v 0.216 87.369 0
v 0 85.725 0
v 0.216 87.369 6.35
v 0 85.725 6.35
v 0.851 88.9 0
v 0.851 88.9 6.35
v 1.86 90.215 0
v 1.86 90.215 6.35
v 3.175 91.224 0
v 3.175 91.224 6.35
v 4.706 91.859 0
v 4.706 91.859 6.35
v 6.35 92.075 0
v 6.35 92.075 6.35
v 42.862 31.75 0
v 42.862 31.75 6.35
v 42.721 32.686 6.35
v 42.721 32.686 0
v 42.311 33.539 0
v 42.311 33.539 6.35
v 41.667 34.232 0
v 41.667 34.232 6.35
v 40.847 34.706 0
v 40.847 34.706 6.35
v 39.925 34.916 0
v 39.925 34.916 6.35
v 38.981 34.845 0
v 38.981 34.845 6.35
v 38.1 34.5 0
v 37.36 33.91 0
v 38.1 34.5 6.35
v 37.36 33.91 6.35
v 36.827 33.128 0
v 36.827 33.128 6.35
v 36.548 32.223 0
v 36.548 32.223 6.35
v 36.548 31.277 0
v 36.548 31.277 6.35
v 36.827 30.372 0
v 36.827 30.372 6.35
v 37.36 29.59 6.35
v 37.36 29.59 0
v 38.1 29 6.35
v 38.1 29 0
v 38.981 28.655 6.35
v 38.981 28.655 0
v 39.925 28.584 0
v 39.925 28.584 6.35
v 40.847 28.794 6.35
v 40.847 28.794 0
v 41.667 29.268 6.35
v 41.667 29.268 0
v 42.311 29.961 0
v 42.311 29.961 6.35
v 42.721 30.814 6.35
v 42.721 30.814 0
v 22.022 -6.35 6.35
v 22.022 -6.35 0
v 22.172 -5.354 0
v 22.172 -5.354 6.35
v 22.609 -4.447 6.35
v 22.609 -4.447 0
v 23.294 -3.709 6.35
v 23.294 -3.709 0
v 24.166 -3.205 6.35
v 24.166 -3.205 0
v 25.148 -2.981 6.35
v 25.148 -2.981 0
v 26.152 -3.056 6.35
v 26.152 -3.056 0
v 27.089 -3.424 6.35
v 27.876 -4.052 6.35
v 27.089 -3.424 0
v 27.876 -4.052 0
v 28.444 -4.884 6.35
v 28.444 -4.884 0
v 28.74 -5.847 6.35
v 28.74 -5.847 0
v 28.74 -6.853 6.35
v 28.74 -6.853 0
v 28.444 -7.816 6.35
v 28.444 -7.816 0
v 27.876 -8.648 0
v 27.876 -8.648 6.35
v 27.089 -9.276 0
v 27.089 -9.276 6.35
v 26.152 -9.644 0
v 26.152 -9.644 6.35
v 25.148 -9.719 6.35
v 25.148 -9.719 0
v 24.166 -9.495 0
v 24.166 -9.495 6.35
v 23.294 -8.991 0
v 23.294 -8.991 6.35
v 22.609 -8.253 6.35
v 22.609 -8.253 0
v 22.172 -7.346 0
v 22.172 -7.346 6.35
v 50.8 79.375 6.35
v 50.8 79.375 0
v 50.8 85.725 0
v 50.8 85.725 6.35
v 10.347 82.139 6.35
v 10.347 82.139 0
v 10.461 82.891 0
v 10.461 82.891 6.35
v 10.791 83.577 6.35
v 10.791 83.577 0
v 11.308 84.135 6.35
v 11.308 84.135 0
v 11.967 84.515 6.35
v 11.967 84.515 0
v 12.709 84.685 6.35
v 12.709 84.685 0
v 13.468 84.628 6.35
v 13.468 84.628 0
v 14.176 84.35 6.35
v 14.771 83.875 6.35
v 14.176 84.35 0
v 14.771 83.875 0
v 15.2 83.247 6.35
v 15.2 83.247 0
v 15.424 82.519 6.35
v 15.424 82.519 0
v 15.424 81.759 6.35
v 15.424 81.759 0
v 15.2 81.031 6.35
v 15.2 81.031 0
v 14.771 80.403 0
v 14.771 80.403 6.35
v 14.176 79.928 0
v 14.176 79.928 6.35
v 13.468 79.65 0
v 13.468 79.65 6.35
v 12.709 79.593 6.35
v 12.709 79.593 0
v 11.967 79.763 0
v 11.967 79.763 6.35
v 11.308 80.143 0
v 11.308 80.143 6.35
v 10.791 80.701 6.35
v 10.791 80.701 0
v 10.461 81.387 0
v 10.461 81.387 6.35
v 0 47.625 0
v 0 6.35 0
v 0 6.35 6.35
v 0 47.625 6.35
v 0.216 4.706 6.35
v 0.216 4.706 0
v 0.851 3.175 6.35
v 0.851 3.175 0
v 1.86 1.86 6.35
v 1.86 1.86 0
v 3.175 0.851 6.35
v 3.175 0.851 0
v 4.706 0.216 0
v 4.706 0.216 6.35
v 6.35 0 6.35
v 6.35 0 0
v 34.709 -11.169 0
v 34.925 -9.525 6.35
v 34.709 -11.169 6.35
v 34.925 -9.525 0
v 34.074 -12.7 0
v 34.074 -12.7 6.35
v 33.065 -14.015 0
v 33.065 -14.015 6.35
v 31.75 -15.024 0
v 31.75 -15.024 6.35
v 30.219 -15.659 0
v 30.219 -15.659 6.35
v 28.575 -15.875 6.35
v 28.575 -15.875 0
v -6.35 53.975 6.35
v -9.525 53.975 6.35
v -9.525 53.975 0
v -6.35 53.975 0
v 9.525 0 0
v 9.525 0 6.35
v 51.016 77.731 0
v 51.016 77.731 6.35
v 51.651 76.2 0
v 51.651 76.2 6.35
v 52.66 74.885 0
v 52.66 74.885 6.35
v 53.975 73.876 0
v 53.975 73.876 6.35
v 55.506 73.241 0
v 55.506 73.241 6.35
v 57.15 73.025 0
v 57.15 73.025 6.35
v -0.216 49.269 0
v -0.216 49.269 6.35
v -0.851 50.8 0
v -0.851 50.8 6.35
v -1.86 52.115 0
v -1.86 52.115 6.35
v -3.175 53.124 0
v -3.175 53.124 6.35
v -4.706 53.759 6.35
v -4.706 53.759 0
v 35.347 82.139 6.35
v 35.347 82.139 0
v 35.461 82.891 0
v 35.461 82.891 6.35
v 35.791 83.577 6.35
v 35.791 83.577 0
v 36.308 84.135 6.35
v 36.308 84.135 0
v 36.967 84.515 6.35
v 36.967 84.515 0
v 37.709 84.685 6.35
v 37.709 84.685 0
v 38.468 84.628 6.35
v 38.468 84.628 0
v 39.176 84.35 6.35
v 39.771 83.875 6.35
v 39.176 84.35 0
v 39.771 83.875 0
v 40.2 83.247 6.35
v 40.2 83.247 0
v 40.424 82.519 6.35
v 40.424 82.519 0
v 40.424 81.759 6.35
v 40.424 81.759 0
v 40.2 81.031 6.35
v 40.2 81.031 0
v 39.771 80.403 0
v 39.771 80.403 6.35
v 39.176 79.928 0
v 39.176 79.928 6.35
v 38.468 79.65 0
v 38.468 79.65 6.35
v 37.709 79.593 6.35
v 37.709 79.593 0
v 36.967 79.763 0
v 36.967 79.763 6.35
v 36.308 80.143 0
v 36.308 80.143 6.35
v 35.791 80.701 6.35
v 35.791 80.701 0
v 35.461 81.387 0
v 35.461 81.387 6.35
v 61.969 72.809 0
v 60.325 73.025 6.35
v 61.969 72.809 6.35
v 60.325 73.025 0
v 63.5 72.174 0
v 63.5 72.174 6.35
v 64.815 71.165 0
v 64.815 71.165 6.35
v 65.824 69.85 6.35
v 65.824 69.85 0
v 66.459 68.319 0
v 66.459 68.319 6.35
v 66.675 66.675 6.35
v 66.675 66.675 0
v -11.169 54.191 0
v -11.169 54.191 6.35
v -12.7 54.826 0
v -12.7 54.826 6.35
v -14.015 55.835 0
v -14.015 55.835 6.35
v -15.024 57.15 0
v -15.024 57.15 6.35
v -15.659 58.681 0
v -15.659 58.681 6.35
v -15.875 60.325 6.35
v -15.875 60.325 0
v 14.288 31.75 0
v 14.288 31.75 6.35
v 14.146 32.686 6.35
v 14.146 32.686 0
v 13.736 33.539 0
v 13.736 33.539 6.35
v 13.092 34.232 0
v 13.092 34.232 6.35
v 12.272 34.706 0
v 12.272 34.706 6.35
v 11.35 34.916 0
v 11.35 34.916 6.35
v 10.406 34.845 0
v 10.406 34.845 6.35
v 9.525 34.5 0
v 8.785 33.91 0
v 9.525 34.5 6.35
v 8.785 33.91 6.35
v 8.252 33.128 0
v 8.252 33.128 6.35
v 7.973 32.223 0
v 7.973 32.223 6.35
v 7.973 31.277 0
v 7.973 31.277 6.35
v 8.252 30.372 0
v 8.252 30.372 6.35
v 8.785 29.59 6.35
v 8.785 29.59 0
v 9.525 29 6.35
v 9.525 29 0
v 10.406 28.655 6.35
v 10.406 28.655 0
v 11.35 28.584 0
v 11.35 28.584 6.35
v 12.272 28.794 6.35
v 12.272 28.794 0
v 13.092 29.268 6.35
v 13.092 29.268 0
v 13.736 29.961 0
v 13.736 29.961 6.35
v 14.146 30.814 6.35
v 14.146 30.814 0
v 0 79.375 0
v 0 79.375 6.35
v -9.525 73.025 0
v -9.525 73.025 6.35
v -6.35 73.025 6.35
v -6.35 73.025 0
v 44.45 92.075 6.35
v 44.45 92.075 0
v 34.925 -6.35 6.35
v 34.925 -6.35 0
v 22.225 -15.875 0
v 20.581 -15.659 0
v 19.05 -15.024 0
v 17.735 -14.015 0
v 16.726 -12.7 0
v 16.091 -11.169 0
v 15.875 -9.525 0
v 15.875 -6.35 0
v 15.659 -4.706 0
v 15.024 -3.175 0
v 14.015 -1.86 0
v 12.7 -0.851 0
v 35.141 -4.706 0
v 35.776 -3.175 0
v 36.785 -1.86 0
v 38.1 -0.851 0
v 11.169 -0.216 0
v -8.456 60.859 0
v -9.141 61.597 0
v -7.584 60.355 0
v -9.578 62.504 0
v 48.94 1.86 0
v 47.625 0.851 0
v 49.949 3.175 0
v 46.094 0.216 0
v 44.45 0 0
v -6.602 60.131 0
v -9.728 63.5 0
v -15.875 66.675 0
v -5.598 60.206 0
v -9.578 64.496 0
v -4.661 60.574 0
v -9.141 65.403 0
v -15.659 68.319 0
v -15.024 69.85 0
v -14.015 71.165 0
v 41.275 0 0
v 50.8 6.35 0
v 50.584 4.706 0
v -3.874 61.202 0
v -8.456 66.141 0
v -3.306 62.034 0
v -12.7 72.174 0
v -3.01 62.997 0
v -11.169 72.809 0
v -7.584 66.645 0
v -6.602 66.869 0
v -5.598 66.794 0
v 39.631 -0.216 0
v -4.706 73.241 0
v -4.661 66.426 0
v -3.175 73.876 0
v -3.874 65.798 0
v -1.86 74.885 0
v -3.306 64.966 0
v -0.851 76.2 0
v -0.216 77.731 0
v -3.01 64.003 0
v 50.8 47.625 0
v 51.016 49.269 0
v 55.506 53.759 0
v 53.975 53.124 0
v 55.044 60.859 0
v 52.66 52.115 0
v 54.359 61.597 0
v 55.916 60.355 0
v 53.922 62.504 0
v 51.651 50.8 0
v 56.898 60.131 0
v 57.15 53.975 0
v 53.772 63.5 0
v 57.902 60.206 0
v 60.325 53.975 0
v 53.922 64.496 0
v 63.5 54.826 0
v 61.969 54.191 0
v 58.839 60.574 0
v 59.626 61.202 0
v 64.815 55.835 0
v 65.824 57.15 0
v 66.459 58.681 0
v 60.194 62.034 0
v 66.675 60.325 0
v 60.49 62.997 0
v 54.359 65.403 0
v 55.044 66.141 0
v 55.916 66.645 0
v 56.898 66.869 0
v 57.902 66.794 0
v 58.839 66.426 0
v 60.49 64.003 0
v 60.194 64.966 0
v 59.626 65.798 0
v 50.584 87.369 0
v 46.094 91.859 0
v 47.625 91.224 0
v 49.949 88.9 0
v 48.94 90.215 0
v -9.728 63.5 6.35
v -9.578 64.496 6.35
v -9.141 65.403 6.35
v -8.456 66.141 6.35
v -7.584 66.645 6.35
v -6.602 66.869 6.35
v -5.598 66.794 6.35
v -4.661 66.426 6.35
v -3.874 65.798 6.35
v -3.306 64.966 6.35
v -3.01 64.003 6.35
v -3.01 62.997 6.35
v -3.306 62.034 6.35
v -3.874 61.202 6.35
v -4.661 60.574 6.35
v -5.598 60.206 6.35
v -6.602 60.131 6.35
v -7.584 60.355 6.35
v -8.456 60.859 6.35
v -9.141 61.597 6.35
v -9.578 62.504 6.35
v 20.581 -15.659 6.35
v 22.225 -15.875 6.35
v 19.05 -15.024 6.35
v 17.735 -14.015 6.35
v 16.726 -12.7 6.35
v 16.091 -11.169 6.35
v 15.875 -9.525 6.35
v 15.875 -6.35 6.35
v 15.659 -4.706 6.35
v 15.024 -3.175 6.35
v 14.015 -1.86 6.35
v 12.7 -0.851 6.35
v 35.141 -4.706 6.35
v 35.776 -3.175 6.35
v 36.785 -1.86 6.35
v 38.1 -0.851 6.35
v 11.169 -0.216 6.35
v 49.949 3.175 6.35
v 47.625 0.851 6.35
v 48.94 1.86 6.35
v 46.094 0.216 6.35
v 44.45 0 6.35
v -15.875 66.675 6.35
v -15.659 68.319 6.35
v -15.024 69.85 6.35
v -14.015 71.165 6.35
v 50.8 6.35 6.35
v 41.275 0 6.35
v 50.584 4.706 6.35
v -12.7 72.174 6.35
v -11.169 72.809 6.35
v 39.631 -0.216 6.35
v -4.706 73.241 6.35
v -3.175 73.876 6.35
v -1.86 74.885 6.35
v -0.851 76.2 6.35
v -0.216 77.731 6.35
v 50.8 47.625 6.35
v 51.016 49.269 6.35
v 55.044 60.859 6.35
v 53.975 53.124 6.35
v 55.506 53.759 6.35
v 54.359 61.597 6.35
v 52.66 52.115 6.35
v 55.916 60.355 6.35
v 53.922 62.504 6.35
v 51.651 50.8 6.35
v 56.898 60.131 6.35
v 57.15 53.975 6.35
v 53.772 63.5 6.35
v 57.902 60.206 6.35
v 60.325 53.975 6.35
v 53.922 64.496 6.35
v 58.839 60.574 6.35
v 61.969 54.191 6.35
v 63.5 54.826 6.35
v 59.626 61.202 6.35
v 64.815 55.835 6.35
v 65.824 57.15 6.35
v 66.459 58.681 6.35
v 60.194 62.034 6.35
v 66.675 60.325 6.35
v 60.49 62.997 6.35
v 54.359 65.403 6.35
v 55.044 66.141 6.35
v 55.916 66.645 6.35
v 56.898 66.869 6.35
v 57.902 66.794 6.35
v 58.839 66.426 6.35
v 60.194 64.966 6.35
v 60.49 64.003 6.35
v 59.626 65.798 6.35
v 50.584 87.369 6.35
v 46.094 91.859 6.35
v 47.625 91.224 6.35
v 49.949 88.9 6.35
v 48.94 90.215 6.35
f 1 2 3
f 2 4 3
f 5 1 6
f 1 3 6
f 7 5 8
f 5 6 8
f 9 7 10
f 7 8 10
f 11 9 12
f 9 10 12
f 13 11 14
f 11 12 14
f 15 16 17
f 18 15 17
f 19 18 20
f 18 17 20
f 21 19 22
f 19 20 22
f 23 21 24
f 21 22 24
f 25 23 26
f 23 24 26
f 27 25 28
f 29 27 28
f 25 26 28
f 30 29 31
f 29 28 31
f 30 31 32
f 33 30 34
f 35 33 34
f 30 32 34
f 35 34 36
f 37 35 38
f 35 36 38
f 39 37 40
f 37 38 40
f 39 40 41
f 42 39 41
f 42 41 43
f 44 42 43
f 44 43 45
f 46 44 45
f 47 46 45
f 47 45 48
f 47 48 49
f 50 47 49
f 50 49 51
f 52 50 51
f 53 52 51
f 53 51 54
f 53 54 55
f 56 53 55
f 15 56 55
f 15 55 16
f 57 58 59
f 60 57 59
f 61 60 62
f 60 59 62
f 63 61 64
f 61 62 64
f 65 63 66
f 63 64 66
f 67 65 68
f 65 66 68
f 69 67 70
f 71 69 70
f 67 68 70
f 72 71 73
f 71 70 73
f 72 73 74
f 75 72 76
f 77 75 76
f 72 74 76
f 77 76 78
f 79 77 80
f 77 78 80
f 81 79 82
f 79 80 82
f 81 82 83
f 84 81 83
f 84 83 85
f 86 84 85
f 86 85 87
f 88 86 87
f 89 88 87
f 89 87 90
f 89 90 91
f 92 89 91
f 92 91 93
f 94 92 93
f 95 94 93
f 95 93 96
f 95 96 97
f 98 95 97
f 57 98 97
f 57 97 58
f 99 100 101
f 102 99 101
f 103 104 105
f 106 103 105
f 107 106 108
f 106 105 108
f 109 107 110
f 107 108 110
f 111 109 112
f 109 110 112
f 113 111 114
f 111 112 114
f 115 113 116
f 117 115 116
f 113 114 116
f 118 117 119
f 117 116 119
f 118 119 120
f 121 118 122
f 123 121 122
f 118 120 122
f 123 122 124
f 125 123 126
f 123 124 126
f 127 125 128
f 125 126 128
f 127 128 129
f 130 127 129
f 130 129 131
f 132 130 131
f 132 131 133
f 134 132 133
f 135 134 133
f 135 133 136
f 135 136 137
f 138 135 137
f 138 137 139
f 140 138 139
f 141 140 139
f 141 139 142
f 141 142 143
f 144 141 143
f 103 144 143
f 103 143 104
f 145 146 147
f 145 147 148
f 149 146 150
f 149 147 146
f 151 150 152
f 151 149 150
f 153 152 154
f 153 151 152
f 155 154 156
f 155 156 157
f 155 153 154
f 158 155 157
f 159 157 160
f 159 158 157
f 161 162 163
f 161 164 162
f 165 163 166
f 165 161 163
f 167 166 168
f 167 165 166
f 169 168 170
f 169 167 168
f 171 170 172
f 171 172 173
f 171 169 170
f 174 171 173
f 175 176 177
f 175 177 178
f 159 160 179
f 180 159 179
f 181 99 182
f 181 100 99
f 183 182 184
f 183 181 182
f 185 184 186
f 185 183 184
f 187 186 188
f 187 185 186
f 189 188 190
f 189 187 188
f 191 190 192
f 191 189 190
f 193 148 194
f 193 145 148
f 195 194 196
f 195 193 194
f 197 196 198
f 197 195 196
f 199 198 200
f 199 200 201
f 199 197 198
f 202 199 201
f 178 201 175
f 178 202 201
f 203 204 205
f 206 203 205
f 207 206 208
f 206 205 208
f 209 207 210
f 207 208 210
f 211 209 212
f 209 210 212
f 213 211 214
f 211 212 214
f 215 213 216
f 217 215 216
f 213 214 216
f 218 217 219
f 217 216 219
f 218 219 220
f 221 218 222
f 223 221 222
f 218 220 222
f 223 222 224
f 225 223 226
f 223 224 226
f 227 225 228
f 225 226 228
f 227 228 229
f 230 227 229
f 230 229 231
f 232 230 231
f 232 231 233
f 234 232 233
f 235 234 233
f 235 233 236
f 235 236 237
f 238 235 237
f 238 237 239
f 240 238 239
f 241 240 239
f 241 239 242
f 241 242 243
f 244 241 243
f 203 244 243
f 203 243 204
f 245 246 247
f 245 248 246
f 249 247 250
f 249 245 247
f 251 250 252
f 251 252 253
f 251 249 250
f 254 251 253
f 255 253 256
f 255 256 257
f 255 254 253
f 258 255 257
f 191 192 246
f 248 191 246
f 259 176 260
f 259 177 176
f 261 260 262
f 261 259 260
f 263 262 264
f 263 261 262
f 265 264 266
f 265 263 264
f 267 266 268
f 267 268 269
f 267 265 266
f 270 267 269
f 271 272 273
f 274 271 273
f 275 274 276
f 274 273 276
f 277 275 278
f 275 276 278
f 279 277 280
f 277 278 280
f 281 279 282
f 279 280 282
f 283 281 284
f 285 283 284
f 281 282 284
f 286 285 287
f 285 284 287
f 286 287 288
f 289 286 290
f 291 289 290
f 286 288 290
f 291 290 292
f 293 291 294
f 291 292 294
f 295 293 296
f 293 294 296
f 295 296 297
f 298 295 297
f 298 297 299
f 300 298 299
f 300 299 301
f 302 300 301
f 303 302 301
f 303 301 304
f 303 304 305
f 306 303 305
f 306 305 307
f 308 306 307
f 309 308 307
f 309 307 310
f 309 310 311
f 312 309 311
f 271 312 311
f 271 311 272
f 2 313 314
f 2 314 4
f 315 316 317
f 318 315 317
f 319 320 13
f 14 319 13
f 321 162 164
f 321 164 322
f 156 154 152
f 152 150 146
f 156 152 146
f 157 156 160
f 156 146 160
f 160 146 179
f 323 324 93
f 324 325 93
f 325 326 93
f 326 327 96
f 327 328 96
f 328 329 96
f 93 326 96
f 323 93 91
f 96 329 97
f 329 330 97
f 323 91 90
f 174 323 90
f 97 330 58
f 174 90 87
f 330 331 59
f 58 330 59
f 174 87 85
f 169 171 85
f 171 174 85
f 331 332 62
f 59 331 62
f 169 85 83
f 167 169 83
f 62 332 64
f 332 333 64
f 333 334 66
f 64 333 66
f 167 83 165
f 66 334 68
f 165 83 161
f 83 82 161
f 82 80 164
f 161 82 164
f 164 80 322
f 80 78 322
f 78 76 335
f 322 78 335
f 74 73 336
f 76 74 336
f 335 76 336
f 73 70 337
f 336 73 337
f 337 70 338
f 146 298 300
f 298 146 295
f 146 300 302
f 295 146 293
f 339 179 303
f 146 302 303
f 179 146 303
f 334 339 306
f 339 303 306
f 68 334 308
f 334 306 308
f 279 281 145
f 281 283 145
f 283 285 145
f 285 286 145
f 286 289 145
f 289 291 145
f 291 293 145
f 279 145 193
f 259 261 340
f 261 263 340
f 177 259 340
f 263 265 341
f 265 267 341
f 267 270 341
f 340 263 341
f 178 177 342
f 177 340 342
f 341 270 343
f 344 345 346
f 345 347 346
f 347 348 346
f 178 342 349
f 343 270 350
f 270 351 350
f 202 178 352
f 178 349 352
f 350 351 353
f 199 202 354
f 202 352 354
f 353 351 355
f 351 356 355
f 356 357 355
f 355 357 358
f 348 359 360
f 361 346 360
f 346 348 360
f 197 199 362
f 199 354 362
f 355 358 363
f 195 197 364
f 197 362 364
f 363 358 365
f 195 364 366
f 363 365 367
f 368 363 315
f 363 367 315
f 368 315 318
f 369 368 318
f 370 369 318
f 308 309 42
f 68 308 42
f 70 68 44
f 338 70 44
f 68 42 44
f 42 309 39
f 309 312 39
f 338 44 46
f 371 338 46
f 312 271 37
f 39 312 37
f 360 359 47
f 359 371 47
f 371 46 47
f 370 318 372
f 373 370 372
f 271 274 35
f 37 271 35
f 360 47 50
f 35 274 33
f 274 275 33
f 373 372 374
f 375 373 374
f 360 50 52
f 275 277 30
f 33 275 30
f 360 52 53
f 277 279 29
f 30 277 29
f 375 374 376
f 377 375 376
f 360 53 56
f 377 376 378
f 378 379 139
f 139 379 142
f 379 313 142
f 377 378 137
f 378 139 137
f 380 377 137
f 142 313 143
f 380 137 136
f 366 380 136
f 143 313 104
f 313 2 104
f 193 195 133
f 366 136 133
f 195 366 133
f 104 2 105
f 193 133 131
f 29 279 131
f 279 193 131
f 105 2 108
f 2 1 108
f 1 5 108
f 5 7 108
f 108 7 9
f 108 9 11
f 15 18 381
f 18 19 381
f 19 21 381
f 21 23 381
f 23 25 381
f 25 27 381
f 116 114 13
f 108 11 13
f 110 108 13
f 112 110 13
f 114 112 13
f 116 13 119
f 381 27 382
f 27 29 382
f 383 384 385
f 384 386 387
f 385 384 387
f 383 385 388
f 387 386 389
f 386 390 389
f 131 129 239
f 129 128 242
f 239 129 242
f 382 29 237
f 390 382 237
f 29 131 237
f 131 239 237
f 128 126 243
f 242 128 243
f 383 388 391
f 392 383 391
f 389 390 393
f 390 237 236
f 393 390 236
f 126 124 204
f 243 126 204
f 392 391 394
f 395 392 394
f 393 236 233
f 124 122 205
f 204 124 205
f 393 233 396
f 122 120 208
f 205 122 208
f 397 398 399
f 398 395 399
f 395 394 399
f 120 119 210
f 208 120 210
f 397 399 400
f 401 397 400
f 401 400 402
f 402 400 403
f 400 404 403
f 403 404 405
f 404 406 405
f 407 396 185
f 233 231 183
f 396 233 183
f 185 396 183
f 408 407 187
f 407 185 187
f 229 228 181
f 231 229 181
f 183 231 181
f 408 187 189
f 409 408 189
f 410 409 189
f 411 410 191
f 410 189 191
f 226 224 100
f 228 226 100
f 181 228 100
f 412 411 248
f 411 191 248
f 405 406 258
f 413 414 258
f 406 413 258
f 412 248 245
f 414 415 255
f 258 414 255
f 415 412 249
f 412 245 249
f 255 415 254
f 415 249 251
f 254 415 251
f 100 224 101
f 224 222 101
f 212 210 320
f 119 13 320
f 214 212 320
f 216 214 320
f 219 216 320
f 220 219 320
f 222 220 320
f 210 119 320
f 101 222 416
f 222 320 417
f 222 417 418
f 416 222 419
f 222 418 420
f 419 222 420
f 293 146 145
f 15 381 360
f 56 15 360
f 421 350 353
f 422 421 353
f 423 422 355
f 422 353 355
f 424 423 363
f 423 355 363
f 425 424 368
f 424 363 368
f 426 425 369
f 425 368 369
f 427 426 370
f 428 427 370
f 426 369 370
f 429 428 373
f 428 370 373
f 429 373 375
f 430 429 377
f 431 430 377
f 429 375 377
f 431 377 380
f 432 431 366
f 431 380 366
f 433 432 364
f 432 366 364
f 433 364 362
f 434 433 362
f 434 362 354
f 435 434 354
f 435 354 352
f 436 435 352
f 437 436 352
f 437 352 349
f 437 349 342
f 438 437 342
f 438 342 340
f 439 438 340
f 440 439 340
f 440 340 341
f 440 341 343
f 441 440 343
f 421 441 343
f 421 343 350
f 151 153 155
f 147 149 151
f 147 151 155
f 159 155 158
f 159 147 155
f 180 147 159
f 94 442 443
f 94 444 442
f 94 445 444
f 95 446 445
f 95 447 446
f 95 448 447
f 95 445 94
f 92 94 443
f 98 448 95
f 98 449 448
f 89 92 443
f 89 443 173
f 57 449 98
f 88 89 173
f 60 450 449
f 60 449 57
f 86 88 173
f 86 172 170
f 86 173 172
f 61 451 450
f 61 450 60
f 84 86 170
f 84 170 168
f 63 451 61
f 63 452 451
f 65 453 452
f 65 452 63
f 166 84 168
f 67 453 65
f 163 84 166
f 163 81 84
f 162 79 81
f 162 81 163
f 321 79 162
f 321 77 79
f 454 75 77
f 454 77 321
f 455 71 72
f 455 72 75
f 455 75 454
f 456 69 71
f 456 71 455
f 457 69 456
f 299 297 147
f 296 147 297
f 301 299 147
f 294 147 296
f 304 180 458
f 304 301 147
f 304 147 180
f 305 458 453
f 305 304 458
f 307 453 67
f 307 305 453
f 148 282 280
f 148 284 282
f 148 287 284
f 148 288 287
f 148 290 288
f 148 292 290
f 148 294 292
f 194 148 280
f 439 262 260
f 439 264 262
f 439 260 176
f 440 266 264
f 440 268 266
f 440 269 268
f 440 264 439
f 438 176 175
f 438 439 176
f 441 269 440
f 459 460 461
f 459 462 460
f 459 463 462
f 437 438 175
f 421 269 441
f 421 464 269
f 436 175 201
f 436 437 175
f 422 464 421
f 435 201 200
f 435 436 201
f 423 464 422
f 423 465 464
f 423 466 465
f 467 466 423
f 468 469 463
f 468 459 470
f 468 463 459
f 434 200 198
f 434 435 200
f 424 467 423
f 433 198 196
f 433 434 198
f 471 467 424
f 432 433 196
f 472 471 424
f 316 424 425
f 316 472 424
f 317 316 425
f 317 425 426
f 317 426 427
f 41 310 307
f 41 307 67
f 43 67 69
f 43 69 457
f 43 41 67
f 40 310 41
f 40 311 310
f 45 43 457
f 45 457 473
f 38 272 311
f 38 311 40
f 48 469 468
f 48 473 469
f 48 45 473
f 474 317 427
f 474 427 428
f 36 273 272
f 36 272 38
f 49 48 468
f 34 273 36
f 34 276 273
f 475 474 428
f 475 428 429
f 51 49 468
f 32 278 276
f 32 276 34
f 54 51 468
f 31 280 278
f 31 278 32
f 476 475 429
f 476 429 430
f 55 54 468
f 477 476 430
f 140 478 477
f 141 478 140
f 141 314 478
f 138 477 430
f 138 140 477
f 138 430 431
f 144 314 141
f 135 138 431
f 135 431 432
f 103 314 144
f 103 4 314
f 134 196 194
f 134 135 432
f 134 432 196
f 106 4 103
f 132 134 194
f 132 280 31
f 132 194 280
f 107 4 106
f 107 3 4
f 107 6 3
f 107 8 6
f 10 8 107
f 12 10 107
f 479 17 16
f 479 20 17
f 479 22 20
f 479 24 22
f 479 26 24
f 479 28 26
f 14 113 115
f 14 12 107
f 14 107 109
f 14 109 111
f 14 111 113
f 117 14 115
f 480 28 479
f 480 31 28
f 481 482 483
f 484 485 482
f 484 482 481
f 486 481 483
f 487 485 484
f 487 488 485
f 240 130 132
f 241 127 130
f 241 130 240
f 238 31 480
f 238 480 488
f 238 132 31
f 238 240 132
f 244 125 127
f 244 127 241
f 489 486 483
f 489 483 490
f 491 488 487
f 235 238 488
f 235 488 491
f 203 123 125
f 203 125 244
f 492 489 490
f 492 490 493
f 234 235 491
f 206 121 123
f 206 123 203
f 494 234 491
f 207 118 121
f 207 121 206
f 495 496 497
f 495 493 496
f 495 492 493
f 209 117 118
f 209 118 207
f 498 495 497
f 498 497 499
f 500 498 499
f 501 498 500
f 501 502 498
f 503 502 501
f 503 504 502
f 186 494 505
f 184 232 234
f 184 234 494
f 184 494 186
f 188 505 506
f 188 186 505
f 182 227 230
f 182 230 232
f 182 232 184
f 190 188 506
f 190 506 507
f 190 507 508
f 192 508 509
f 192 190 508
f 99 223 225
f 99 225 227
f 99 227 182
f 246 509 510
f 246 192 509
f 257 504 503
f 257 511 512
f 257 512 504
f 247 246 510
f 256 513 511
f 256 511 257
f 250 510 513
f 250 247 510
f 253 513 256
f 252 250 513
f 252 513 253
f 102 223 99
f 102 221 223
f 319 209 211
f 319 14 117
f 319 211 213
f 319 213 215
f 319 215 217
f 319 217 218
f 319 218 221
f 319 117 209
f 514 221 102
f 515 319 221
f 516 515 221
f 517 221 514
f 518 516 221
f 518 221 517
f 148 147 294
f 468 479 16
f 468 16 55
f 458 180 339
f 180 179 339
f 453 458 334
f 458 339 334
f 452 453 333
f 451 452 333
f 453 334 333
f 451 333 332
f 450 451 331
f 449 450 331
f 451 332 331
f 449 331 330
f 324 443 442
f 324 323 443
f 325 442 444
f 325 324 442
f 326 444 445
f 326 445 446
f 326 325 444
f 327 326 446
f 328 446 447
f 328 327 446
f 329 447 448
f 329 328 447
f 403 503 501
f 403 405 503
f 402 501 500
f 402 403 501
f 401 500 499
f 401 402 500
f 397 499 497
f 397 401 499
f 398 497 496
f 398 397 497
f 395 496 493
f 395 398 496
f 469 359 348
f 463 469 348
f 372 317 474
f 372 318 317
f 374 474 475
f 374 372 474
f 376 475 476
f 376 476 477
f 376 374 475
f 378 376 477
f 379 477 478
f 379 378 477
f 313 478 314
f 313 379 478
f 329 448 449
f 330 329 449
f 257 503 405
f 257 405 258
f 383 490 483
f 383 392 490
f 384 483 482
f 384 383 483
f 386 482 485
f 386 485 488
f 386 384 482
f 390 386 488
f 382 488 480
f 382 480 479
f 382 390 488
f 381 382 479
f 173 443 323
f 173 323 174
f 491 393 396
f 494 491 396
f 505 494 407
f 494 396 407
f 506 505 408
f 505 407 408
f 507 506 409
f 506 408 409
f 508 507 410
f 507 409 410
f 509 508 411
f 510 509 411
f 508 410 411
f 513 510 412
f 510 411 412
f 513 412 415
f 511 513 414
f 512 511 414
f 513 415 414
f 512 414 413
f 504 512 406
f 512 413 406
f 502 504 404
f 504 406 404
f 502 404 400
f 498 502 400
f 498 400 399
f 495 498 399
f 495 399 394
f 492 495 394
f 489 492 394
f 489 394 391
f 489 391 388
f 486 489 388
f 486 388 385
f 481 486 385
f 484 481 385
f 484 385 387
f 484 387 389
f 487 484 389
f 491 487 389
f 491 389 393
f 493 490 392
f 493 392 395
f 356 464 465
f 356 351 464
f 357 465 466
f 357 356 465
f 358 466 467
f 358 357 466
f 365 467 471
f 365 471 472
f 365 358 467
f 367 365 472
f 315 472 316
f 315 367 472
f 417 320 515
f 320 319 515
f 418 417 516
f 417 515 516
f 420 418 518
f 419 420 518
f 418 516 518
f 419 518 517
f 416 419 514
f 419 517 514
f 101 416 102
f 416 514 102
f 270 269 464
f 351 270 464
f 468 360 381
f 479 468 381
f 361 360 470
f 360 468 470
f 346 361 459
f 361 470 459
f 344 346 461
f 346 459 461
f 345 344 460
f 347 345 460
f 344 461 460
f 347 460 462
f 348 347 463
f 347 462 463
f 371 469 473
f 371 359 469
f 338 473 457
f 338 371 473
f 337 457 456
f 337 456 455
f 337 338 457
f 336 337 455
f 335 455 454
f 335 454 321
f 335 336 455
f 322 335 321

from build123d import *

# Parameters (mm, degrees)
SKETCH1_W                   = 50.8
SKETCH1_H                   = 101.6
BOSS_EXTRUDE1_DEPTH         = 6.35
F_7_0_201_DIAMETER_HOLE1_D  = 5.1054
SKETCH4_W                   = 15.875
SKETCH4_H                   = 19.05
SKETCH4_W_2                 = 19.05
SKETCH4_H_2                 = 15.875
BOSS_EXTRUDE2_DEPTH         = 6.35
F_1_4_CLEARANCE_HOLE1_D     = 6.7564
SKETCH7_W                   = 50.8
SKETCH7_H                   = 9.525
CUT_EXTRUDE1_DEPTH          = 122.689926144
FILLET1_R                   = 6.35
F_1_4_0_25_DIAMETER_HOLE1_D = 6.35


with BuildPart() as part:
    # Sketch1 → Boss-Extrude1 (new body)
    with BuildSketch(Plane.XY):
        with Locations((25.4, 50.8)):
            Rectangle(SKETCH1_W, SKETCH1_H)
    extrude(amount=BOSS_EXTRUDE1_DEPTH)

    # #7 (0.201) Diameter Hole1 (through all)
    with Locations(Plane.XY.offset(6.35)):
        with Locations((12.899999981, 82.13900006), (37.900000019, 82.13900006)):
            Hole(F_7_0_201_DIAMETER_HOLE1_D / 2)

    # Sketch4 → Boss-Extrude2 (add)
    with BuildSketch(Plane.XY.offset(6.35)):
        with Locations((-7.9375, 63.5)):
            Rectangle(SKETCH4_W, SKETCH4_H)
        with Locations((58.7375, 63.5)):
            Rectangle(SKETCH4_W, SKETCH4_H)
        with Locations((25.4, -7.9375)):
            Rectangle(SKETCH4_W_2, SKETCH4_H_2)
    extrude(amount=-BOSS_EXTRUDE2_DEPTH)

    # 1/4 Clearance Hole1 (through all)
    with Locations(Plane.XY.offset(6.35)):
        with Locations((-6.35, 63.5), (57.15, 63.5), (25.4, -6.35)):
            Hole(F_1_4_CLEARANCE_HOLE1_D / 2)

    # Sketch7 → Cut-Extrude1 (cut, through all)
    with BuildSketch(Plane(origin=(0, 0, 0), x_dir=(-1, 0, 0), z_dir=(0, 0, -1))):
        with Locations((-25.4, 96.8375)):
            Rectangle(SKETCH7_W, SKETCH7_H)
    extrude(amount=-CUT_EXTRUDE1_DEPTH, mode=Mode.SUBTRACT)

    # Fillet1
    fillet1_edges = [part.edges().sort_by_distance(p)[0] for p in [
        (-15.875, 73.025, 3.175),
        (-15.875, 53.975, 3.175),
        (0, 53.975, 3.175),
        (0, 73.025, 3.175),
        (50.8, 53.975, 3.175),
        (66.675, 53.975, 3.175),
        (66.675, 73.025, 3.175),
        (50.8, 73.025, 3.175),
        (34.925, -15.875, 3.175),
        (34.925, 0, 3.175),
        (15.875, 0, 3.175),
        (15.875, -15.875, 3.175),
        (50.8, 0, 3.175),
        (0, 0, 3.175),
        (50.8, 92.075, 3.175),
        (0, 92.075, 3.175),
    ]]
    fillet(fillet1_edges, radius=FILLET1_R)

    # 1/4 (0.25) Diameter Hole1 (through all)
    with Locations(Plane(origin=(0, 0, 0), x_dir=(-1, 0, 0), z_dir=(0, 0, -1))):
        with Locations((-39.6875, 31.75), (-11.1125, 31.75)):
            Hole(F_1_4_0_25_DIAMETER_HOLE1_D / 2)


solid = part.part
